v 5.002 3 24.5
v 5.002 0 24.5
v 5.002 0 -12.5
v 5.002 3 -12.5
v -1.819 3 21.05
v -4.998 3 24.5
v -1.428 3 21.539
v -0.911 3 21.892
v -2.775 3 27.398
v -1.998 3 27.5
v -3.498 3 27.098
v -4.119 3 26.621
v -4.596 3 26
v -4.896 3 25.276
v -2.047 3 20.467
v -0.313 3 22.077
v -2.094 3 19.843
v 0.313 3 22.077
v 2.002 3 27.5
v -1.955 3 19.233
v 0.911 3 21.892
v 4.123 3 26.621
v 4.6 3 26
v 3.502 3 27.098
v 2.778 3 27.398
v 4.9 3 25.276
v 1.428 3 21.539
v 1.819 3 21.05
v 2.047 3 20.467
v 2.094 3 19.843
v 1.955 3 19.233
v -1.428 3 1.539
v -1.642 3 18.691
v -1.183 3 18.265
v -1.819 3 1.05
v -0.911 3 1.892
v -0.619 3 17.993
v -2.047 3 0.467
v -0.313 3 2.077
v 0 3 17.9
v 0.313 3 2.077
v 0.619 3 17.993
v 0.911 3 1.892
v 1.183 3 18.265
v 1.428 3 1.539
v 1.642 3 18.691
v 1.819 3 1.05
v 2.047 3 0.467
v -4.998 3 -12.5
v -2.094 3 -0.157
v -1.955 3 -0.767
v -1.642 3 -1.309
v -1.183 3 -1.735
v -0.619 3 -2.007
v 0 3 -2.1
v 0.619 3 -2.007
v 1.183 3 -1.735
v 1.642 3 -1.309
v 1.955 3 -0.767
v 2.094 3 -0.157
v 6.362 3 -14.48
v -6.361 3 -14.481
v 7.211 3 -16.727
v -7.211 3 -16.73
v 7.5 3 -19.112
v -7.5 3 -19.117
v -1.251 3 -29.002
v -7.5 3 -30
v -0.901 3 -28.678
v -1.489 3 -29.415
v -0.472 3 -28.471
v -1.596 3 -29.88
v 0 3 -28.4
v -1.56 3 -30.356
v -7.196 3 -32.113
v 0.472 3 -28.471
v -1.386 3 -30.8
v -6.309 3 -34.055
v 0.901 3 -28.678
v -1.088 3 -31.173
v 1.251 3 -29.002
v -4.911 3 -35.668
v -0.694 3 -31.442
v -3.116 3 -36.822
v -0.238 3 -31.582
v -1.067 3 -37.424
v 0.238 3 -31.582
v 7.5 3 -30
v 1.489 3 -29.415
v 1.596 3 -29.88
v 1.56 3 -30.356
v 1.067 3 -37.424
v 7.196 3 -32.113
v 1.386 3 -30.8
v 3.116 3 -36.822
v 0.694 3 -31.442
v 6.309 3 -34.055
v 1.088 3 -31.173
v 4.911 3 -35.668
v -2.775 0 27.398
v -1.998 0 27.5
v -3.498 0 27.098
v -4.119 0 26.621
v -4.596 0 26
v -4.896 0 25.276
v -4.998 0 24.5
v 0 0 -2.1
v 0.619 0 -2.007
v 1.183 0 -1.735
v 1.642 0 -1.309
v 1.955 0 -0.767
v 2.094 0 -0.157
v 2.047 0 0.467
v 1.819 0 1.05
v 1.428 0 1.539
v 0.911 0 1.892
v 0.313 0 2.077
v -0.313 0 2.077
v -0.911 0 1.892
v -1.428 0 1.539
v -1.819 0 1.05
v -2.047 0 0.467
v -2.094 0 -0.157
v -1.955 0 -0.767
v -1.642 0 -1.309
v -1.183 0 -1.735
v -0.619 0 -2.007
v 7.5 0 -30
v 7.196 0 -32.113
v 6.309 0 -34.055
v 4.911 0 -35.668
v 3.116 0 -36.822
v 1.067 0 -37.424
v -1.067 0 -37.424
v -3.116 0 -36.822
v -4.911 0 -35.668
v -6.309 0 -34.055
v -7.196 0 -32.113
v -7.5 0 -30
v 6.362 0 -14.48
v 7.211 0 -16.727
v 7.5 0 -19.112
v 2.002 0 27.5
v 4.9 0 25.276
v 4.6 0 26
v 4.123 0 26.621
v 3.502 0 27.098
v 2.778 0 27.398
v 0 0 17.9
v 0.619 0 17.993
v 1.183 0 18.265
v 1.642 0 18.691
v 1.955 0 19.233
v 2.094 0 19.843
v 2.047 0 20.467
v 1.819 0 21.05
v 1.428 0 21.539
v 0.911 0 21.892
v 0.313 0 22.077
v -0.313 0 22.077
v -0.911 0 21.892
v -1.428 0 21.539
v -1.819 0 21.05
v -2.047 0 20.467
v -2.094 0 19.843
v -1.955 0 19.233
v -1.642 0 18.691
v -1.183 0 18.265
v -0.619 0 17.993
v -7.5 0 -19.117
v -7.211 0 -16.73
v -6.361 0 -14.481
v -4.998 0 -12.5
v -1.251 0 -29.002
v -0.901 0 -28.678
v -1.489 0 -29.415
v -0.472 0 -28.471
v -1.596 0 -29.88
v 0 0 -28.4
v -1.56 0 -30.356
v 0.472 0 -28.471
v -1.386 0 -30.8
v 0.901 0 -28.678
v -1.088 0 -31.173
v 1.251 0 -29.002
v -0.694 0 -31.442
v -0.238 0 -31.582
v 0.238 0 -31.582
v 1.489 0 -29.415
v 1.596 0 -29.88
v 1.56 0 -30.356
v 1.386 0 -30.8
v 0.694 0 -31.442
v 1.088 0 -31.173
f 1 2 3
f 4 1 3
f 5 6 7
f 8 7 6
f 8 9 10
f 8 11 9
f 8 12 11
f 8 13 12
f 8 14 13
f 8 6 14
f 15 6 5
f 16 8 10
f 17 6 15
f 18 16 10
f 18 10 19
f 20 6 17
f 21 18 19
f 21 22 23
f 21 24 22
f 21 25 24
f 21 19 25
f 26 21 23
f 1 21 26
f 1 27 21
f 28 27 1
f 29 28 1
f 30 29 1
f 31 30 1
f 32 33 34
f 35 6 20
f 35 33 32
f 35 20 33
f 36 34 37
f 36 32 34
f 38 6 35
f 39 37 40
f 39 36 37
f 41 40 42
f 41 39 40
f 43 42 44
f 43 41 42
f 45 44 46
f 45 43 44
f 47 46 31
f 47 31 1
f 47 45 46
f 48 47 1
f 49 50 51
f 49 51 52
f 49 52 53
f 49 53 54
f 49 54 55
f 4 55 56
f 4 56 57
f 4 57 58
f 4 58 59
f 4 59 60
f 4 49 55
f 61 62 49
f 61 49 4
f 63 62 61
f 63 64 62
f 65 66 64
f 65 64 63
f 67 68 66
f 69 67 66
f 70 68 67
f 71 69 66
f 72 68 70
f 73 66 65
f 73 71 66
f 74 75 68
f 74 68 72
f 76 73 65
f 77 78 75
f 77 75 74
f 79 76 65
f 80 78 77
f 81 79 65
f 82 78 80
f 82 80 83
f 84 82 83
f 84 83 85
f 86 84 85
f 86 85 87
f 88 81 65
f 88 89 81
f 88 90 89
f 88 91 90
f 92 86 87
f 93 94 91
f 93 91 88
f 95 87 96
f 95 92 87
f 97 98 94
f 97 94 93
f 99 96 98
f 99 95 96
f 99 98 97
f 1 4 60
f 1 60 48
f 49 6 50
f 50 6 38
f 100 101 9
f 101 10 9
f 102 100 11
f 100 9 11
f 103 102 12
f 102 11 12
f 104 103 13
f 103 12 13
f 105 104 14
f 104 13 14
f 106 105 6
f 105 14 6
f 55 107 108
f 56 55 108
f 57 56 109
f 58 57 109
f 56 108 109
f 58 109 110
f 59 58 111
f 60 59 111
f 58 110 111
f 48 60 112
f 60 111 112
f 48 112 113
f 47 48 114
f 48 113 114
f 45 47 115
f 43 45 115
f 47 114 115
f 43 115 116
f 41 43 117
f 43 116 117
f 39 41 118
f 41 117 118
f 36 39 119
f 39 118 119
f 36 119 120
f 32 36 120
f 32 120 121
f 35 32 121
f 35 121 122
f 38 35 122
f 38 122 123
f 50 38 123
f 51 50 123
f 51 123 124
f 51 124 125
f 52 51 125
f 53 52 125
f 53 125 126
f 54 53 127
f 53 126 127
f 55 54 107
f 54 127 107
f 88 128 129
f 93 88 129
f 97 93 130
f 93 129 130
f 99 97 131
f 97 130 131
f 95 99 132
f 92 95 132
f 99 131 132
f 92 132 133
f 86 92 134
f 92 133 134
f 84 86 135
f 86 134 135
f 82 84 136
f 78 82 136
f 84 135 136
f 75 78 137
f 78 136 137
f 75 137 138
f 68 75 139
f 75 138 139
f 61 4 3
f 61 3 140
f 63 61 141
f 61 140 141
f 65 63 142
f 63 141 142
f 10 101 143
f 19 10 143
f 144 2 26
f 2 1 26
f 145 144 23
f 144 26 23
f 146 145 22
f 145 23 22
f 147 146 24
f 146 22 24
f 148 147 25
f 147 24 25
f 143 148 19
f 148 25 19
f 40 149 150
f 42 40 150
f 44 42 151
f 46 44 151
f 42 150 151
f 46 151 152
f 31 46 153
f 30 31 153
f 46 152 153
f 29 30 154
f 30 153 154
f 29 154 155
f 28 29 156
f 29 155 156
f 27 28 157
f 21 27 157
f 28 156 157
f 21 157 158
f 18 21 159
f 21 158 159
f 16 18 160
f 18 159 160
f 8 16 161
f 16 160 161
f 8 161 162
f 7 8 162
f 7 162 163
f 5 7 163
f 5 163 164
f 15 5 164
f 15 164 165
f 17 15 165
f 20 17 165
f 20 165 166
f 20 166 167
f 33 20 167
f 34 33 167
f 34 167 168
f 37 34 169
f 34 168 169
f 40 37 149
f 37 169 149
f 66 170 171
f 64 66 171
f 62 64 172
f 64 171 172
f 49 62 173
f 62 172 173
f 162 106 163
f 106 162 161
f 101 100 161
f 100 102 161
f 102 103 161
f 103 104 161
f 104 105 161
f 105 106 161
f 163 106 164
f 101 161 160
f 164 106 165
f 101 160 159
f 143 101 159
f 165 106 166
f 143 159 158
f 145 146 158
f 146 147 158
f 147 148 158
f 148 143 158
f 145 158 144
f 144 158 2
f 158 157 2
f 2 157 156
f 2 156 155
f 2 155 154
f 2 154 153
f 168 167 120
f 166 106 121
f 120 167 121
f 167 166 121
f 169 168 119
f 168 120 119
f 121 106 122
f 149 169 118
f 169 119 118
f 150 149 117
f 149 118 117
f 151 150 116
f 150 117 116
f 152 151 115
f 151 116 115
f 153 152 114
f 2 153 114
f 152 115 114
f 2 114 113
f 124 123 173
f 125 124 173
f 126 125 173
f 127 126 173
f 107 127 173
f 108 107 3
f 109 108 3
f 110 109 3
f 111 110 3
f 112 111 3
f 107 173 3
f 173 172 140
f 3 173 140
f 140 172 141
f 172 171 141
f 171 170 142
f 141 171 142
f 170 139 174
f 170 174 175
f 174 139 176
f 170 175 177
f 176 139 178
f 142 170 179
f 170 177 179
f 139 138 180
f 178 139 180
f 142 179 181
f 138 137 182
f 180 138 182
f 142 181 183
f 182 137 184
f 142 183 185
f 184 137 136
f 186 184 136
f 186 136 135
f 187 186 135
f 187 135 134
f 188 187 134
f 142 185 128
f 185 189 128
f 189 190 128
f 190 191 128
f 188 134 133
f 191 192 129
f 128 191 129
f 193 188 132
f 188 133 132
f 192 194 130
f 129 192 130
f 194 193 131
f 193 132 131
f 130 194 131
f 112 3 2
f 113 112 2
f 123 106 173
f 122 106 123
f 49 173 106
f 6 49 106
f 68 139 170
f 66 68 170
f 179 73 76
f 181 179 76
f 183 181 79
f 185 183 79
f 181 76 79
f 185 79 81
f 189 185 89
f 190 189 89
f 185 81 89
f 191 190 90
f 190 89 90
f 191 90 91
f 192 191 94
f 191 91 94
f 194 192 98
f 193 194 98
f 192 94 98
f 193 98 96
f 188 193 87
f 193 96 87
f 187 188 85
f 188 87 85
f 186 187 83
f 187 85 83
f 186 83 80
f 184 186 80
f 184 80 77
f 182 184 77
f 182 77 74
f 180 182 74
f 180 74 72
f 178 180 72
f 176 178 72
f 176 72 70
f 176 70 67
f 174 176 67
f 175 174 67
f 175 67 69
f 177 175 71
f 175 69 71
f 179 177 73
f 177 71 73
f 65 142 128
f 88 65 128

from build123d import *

# Parameters (mm, degrees)
EXTRUDE_1_DEPTH     = 3
SKETCH_2_R          = 1.6
CUT_EXTRUDE_1_DEPTH = 3
SKETCH_3_R          = 2.1
CUT_EXTRUDE_2_DEPTH = 3
CUT_EXTRUDE_3_DEPTH = 10
FILLET_1_R          = 10
FILLET_2_R          = 3


with BuildPart() as part:
    # 草图1 → 凸台-拉伸1 (new body)
    with BuildSketch(Plane(origin=(0, 0, 0), x_dir=(1, 0, 0), z_dir=(0, 1, 0))):
        with BuildLine():
            Line((-7.5, -30), (7.5, -30))
            Line((7.5, -30), (7.5, 30))
            ThreePointArc((7.5, 30), (0, 37.5), (-7.5, 30))
            Line((-7.5, 30), (-7.5, -30))
        make_face()
    extrude(amount=EXTRUDE_1_DEPTH)

    # 草图2 → 切除-拉伸1 (cut)
    with BuildSketch(Plane(origin=(0, 3, 0), x_dir=(1, 0, 0), z_dir=(0, 1, 0))):
        with Locations(Location((0, 30, 0), (0, 0, 270))):
            Circle(SKETCH_2_R)
    extrude(amount=-CUT_EXTRUDE_1_DEPTH, mode=Mode.SUBTRACT)

    # 草图3 → 切除-拉伸2 (cut)
    with BuildSketch(Plane.XZ):
        with Locations(Location((0, 20, 0), (0, 0, 270))):
            Circle(SKETCH_3_R)
        with Locations(Location((0, 0, 0), (0, 0, 270))):
            Circle(SKETCH_3_R)
    extrude(amount=-CUT_EXTRUDE_2_DEPTH, mode=Mode.SUBTRACT)

    # 草图4 → 切除-拉伸3 (cut)
    with BuildSketch(Plane.XZ):
        Polygon((-7.5, -12.5), (-4.9980923, -12.5), (-4.9980923, 27.5), (5.0019077, 27.5), (5.0019077, -12.5), (7.5, -12.5), (7.5, 30), (-7.5, 30), align=None)
    extrude(amount=-CUT_EXTRUDE_3_DEPTH, mode=Mode.SUBTRACT)

    # 圆角1
    # the kernel refuses this fillet: 10 mm, written as the material it takes off along each edge
    with BuildSketch(Plane(origin=(7.5, -16.5305363, -12.5), x_dir=(0, 0, -1), z_dir=(0, 1, 0))) as fillet_1_piece_1:
        with BuildLine():
            CenterArc((6.61221452, 10), FILLET_1_R, 228.606905679, 41.393094321)
            Line((0, 2.4980923), (-0.13224429, 2.348054146))
            ThreePointArc((-0.13224429, 2.348054146), (-0.2, 1.24904615), (-0.2, 0))
            Line((-0.2, 0), (0, -0.2))
            Line((0, -0.2), (6.61221452, -0.2))
            Line((6.61221452, -0.2), (6.61221452, 0))
        make_face()
    extrude(amount=36.061072601, mode=Mode.SUBTRACT)
    with BuildSketch(Plane(origin=(-7.5, -16.541351944, -12.5), x_dir=(0, 0, -1), z_dir=(0, 1, 0))) as fillet_1_piece_2:
        with BuildLine():
            CenterArc((6.616540778, -10), FILLET_1_R, 90, 41.426144493)
            Line((0, -2.5019077), (-0.132330816, -2.351945854))
            ThreePointArc((-0.132330816, -2.351945854), (-0.2, -1.25095385), (-0.2, 0))
            Line((-0.2, 0), (0, 0.2))
            Line((0, 0.2), (6.616540778, 0.2))
            Line((6.616540778, 0.2), (6.616540778, 0))
        make_face()
    extrude(amount=36.082703888, mode=Mode.SUBTRACT)

    # 圆角2
    fillet_2_edges = [part.edges().sort_by_distance(p)[0] for p in [
        (5.0019077, 1.5, 27.5),
        (-4.9980923, 1.5, 27.5),
    ]]
    fillet(fillet_2_edges, radius=FILLET_2_R)


solid = part.part
